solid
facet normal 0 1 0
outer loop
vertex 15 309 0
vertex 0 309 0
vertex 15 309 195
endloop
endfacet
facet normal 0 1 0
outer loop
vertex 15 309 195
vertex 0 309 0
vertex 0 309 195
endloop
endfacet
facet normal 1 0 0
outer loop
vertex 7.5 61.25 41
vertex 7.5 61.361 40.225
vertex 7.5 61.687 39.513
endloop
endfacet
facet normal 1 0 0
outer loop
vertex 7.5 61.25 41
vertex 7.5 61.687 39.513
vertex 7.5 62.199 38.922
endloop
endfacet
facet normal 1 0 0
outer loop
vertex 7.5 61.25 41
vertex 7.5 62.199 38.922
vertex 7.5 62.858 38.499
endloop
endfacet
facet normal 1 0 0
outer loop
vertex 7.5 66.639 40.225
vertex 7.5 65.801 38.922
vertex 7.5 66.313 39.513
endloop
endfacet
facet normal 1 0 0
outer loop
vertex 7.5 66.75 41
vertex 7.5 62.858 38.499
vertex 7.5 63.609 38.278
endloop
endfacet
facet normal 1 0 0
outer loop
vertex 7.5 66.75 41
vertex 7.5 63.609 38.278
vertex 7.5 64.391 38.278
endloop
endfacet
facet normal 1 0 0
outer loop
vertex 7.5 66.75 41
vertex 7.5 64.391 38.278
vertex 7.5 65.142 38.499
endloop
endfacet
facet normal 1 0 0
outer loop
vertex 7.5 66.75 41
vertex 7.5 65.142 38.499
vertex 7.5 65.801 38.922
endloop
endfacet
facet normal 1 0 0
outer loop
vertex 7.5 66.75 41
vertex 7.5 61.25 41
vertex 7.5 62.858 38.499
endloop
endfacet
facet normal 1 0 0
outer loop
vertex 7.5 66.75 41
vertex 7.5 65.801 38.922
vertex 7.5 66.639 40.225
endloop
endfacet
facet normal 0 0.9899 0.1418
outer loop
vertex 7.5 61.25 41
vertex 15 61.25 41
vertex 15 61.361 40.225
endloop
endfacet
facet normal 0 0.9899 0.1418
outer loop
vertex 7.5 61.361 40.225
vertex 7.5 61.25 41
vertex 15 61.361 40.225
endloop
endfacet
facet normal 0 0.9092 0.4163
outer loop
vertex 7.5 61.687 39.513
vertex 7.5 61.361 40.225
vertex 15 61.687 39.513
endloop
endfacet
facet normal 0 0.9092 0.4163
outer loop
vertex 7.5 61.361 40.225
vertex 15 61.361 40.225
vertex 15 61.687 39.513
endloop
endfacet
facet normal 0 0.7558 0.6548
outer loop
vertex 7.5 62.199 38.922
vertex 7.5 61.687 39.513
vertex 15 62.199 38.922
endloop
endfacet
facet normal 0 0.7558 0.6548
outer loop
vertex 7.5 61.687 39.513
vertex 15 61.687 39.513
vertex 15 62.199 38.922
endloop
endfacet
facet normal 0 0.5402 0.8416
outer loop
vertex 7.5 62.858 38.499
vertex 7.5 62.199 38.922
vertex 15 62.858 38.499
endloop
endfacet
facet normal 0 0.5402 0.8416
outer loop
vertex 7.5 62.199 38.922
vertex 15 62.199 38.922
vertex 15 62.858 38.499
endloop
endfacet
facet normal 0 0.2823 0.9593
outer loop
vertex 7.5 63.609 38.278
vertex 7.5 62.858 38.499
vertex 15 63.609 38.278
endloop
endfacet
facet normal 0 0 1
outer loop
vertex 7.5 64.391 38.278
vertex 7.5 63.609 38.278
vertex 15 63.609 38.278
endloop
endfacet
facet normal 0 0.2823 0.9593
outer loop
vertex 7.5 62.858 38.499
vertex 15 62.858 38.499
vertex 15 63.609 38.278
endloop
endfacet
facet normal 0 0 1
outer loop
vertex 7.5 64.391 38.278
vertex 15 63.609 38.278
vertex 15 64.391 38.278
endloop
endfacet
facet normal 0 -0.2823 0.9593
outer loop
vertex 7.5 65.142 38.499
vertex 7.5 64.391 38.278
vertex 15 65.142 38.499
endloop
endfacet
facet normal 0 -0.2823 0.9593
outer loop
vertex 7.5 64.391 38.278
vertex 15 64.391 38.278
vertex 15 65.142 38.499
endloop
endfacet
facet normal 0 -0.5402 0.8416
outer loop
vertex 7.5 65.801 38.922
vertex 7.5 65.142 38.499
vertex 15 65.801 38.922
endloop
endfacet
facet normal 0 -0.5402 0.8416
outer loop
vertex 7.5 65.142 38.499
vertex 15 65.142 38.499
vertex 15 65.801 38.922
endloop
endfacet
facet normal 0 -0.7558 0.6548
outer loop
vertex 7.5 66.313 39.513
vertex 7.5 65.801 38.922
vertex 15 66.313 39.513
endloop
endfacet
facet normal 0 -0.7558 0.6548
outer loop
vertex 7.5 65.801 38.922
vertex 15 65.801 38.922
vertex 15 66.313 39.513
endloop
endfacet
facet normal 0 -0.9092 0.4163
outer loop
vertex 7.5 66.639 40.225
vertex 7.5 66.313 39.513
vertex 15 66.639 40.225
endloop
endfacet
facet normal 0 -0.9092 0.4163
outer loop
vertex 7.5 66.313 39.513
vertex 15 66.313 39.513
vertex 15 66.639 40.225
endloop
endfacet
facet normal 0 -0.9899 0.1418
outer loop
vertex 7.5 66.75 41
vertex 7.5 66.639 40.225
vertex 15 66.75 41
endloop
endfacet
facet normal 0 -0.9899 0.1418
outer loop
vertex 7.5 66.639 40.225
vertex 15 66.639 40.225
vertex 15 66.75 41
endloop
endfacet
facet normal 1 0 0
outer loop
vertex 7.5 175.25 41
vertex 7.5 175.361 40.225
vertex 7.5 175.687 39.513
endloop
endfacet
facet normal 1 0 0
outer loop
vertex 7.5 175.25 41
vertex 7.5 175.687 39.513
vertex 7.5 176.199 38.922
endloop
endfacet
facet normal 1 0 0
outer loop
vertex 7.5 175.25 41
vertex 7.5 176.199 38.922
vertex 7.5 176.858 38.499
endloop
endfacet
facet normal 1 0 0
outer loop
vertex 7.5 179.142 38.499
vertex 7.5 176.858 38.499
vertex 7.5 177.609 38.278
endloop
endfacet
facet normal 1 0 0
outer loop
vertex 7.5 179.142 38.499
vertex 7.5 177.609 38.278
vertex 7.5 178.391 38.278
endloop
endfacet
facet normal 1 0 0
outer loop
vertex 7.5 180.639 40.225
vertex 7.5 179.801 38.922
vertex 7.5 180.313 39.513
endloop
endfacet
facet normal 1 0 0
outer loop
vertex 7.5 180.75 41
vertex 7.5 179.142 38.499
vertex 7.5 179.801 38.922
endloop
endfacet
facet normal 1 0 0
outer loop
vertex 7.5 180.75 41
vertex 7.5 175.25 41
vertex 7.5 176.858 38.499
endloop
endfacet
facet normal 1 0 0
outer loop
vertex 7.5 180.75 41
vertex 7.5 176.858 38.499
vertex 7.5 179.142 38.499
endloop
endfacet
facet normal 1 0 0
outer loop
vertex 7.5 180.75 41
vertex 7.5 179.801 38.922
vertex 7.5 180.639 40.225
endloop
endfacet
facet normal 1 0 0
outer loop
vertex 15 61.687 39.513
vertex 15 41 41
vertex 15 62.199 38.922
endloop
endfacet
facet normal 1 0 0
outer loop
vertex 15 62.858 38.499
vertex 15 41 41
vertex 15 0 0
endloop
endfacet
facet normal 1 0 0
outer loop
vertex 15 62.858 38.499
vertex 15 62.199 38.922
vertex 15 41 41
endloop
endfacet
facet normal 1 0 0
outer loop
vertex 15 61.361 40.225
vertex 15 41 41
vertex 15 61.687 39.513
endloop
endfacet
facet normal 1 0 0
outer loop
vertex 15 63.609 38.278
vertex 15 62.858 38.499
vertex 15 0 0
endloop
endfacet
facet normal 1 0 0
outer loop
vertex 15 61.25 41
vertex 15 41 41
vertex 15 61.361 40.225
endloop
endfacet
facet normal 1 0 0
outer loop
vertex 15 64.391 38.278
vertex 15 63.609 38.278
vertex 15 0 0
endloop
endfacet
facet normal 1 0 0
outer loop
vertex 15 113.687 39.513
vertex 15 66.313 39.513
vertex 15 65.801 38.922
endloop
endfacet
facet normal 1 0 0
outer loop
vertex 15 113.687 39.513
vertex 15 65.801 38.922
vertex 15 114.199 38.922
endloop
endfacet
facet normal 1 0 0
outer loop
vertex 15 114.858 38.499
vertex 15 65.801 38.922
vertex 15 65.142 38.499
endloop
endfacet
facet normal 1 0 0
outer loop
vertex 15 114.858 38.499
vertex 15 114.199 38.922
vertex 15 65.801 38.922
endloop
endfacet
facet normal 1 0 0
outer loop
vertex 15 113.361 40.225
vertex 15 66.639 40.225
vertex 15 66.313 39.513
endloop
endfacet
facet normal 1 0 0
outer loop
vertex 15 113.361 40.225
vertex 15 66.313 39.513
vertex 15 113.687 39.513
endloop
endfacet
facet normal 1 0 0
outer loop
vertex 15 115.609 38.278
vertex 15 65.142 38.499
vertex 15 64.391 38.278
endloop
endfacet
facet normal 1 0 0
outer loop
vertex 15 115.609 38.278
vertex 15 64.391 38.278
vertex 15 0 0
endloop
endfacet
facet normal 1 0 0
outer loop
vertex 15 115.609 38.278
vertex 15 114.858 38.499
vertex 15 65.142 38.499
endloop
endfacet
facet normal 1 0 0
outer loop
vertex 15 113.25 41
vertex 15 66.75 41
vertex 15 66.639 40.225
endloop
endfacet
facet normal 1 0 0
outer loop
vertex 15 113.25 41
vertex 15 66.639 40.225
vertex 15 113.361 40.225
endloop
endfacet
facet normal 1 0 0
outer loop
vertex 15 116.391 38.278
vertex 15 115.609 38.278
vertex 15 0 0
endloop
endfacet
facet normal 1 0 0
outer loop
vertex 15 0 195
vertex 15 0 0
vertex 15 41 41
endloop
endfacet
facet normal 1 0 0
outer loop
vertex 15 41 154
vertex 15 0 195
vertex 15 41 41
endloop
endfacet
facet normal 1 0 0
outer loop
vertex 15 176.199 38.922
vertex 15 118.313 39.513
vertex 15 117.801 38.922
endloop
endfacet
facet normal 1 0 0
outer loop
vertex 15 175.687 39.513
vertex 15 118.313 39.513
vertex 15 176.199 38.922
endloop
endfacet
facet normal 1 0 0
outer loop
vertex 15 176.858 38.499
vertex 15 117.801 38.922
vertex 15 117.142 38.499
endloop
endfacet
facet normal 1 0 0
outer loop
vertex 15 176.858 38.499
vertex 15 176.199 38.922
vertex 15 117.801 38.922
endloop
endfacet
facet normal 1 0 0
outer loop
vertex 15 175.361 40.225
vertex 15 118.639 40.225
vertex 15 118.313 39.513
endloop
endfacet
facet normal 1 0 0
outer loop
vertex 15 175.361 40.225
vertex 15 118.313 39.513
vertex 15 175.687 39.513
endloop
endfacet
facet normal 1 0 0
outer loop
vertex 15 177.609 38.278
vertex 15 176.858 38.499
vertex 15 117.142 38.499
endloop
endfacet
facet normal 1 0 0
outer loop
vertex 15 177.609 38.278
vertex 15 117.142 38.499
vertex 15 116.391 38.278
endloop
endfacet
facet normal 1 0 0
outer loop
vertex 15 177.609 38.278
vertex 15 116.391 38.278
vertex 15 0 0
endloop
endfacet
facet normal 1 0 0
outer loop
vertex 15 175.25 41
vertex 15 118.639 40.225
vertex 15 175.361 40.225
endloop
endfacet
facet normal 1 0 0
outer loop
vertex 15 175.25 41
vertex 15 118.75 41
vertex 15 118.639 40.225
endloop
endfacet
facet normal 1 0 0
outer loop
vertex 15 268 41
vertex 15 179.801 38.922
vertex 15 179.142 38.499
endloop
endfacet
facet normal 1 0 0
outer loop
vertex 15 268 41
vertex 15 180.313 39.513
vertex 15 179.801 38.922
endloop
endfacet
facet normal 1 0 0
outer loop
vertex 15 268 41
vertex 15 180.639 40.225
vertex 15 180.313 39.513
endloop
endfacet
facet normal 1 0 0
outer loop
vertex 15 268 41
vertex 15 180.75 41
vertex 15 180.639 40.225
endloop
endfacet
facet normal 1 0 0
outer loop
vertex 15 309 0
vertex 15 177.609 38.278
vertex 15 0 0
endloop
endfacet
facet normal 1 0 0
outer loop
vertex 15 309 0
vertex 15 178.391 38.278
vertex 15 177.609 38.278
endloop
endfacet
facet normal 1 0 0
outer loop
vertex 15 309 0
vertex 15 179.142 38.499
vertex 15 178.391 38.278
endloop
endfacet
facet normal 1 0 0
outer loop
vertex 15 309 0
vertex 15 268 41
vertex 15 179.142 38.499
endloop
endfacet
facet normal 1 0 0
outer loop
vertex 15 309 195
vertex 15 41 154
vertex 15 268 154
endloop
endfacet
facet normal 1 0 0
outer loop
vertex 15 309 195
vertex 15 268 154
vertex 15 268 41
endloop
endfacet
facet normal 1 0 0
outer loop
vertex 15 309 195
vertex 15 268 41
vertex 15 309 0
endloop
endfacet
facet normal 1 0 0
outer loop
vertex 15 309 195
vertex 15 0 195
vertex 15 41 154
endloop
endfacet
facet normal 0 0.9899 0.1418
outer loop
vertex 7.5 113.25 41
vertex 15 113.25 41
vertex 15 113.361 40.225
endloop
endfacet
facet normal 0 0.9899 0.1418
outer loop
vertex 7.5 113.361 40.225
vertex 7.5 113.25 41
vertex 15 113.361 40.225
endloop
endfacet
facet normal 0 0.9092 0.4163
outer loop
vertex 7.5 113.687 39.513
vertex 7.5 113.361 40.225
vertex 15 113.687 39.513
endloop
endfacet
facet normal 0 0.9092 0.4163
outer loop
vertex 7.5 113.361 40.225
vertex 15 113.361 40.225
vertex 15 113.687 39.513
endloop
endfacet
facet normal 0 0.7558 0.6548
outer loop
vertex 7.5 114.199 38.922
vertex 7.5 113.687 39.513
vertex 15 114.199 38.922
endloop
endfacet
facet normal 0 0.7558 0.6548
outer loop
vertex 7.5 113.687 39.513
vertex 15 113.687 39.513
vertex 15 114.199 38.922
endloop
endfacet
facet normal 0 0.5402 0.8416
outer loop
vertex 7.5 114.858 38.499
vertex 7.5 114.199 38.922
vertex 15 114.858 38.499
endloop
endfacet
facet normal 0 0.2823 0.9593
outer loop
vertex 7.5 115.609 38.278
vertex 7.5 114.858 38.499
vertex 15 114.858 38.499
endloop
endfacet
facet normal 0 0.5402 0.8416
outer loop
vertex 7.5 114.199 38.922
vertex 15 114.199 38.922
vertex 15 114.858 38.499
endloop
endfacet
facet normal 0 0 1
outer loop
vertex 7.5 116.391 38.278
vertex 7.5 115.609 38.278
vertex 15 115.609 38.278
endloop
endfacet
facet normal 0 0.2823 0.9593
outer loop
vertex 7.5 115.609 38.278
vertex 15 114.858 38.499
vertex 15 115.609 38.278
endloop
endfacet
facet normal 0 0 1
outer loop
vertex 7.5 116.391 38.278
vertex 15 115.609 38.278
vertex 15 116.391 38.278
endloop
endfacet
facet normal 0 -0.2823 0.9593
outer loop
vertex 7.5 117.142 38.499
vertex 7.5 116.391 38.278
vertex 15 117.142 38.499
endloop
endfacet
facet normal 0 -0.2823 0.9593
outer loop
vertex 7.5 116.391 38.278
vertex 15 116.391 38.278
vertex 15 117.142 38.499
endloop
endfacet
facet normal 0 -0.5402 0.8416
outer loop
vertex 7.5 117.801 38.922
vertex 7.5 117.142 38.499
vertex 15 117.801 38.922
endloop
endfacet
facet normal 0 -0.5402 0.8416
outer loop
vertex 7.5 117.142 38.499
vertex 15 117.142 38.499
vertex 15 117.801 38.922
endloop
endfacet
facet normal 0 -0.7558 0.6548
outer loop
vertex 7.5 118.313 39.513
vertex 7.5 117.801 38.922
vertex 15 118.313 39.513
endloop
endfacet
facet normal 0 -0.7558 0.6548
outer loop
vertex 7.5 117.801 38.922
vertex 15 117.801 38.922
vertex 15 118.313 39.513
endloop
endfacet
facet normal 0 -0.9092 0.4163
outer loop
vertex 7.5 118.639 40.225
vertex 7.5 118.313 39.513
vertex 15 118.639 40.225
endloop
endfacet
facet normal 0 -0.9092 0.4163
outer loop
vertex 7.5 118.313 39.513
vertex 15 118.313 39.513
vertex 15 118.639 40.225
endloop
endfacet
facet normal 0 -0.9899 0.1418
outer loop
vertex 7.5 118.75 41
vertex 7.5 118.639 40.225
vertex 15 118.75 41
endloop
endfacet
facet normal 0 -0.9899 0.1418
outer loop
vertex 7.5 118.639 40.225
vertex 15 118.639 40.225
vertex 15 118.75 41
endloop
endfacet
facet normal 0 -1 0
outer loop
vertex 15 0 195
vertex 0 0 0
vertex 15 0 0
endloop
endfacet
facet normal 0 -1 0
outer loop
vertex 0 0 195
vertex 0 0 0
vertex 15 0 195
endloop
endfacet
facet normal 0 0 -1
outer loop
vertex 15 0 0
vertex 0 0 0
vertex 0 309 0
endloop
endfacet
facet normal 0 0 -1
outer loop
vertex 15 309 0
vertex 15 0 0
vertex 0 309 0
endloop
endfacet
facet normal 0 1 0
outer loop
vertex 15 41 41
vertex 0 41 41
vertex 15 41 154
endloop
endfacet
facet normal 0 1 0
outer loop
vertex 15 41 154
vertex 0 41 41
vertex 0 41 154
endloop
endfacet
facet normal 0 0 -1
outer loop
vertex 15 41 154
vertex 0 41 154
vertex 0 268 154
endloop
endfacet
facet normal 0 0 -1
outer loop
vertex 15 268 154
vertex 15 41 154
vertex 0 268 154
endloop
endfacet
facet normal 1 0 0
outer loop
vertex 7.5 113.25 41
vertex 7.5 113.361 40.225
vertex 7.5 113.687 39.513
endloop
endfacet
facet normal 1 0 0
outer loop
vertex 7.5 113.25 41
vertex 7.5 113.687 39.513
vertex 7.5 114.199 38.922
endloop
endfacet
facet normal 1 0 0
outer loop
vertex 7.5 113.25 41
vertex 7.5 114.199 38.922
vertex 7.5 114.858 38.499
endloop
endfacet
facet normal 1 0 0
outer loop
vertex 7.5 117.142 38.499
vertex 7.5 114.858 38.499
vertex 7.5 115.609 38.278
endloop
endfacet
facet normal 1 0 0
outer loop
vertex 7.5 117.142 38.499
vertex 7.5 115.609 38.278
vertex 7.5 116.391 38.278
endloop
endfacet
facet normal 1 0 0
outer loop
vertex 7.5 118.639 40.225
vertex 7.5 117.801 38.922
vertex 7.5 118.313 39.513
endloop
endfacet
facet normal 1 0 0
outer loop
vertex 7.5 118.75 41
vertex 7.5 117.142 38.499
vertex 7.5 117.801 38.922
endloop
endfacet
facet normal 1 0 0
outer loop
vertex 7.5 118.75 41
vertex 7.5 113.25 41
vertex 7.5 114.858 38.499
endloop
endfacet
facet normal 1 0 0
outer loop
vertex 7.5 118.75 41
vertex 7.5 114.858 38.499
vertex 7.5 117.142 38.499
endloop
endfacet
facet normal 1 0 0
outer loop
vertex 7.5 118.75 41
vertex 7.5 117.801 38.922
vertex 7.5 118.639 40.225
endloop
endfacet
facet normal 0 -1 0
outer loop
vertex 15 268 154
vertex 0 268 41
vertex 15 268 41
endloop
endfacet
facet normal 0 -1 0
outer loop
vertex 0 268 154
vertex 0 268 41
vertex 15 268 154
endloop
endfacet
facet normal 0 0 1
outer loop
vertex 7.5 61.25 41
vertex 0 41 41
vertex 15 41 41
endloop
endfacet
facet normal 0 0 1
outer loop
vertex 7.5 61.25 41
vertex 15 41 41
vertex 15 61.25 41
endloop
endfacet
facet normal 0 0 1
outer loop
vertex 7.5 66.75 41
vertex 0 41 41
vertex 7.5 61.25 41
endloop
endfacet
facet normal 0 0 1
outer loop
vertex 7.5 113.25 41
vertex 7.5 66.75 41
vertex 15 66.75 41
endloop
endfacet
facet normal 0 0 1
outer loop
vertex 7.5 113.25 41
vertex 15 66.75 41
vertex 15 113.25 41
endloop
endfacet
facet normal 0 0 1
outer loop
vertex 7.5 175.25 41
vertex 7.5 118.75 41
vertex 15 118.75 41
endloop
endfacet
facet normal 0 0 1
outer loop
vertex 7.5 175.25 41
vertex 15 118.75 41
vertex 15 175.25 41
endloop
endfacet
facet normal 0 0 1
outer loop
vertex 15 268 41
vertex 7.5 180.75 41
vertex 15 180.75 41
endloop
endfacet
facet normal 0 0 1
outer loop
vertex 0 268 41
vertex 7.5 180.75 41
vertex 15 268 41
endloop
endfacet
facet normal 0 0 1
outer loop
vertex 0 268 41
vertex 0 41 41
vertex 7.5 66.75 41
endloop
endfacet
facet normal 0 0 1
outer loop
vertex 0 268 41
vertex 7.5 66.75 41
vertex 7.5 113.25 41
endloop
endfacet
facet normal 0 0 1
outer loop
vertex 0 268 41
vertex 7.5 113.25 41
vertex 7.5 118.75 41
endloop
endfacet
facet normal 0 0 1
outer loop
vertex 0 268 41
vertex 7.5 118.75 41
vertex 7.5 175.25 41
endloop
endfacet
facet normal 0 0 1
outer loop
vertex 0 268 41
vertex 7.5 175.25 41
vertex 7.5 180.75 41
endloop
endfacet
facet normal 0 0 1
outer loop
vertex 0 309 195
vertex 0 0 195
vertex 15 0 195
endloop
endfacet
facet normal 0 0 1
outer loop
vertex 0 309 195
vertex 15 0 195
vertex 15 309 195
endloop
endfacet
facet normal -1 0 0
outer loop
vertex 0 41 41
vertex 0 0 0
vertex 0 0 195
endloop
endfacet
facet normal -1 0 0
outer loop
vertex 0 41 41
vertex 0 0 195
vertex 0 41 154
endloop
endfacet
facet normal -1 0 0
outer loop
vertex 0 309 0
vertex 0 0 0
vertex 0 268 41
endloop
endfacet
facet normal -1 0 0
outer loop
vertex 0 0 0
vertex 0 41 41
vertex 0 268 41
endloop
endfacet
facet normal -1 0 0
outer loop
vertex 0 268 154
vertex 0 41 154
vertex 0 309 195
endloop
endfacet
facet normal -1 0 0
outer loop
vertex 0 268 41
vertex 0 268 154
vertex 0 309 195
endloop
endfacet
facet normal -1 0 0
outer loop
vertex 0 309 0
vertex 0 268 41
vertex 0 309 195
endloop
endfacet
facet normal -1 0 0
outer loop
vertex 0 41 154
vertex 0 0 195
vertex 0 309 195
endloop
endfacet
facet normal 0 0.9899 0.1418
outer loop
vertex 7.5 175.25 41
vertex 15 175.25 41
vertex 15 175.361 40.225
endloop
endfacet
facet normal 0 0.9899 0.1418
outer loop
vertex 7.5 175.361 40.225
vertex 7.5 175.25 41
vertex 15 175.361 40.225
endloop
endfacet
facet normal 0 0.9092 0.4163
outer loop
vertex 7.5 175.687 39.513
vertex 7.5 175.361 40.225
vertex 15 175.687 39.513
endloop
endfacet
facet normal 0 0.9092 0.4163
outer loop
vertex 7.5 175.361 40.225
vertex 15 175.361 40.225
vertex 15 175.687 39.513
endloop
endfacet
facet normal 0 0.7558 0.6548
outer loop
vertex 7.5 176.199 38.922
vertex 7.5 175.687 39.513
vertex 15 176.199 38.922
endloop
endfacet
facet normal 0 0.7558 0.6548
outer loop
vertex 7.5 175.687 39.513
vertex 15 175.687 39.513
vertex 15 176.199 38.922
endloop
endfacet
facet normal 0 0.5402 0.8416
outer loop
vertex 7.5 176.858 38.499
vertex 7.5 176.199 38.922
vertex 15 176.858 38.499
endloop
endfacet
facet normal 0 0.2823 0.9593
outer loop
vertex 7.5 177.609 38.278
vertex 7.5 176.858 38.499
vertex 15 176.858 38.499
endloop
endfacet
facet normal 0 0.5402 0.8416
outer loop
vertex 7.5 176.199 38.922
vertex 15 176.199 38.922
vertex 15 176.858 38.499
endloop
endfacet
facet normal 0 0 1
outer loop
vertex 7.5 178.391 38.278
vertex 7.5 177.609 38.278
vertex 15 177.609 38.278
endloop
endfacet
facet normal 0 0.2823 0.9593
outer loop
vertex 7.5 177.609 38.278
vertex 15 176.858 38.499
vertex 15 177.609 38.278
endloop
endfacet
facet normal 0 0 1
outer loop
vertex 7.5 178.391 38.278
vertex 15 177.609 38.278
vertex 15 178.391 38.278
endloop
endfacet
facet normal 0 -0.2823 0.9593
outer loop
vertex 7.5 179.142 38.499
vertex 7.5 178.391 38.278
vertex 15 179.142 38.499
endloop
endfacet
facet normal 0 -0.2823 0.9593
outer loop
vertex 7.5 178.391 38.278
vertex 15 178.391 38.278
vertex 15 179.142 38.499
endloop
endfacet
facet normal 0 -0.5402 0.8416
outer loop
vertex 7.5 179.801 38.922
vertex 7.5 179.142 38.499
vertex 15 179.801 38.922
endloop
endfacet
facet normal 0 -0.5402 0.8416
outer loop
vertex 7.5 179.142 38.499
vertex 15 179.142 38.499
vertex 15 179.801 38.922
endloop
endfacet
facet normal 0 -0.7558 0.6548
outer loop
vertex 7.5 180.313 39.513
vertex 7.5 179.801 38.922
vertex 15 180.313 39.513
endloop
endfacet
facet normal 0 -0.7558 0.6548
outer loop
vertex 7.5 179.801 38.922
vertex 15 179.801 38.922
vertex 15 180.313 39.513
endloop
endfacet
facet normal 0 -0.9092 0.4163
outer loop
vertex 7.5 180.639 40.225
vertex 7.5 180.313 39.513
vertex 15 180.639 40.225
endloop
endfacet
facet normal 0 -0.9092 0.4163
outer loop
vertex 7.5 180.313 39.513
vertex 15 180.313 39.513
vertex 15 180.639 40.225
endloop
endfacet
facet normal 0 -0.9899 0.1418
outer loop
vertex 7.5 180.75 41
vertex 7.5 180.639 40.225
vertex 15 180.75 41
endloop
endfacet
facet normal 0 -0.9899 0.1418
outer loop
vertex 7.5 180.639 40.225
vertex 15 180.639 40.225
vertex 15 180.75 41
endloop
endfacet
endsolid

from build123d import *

# Parameters (mm, degrees)
CROQUIS1_W              = 309
CROQUIS1_H              = 195
CROQUIS1_W_2            = 227
CROQUIS1_H_2            = 113
SALIENTE_EXTRUIR1_DEPTH = 15
CROQUIS2_R              = 2.75
CORTAR_EXTRUIR1_DEPTH   = 7.5


with BuildPart() as part:
    # Croquis1 → Saliente-Extruir1 (new body)
    with BuildSketch(Plane.YZ):
        with Locations((154.5, 97.5)):
            Rectangle(CROQUIS1_W, CROQUIS1_H)
        with Locations((154.5, 97.5)):
            Rectangle(CROQUIS1_W_2, CROQUIS1_H_2, mode=Mode.SUBTRACT)
    extrude(amount=SALIENTE_EXTRUIR1_DEPTH)

    # Croquis2 → Cortar-Extruir1 (cut)
    with BuildSketch(Plane.YZ.offset(15)):
        with BuildLine():
            ThreePointArc((66.75, 41), (64, 43.75), (61.25, 41))
            Line((61.25, 41), (66.75, 41))
        make_face()
        with BuildLine():
            Line((66.75, 41), (61.25, 41))
            ThreePointArc((61.25, 41), (64, 38.25), (66.75, 41))
        make_face()
        with Locations((116, 41)):
            Circle(CROQUIS2_R)
        with Locations((178, 41)):
            Circle(CROQUIS2_R)
    extrude(amount=-CORTAR_EXTRUIR1_DEPTH, mode=Mode.SUBTRACT)


solid = part.part
